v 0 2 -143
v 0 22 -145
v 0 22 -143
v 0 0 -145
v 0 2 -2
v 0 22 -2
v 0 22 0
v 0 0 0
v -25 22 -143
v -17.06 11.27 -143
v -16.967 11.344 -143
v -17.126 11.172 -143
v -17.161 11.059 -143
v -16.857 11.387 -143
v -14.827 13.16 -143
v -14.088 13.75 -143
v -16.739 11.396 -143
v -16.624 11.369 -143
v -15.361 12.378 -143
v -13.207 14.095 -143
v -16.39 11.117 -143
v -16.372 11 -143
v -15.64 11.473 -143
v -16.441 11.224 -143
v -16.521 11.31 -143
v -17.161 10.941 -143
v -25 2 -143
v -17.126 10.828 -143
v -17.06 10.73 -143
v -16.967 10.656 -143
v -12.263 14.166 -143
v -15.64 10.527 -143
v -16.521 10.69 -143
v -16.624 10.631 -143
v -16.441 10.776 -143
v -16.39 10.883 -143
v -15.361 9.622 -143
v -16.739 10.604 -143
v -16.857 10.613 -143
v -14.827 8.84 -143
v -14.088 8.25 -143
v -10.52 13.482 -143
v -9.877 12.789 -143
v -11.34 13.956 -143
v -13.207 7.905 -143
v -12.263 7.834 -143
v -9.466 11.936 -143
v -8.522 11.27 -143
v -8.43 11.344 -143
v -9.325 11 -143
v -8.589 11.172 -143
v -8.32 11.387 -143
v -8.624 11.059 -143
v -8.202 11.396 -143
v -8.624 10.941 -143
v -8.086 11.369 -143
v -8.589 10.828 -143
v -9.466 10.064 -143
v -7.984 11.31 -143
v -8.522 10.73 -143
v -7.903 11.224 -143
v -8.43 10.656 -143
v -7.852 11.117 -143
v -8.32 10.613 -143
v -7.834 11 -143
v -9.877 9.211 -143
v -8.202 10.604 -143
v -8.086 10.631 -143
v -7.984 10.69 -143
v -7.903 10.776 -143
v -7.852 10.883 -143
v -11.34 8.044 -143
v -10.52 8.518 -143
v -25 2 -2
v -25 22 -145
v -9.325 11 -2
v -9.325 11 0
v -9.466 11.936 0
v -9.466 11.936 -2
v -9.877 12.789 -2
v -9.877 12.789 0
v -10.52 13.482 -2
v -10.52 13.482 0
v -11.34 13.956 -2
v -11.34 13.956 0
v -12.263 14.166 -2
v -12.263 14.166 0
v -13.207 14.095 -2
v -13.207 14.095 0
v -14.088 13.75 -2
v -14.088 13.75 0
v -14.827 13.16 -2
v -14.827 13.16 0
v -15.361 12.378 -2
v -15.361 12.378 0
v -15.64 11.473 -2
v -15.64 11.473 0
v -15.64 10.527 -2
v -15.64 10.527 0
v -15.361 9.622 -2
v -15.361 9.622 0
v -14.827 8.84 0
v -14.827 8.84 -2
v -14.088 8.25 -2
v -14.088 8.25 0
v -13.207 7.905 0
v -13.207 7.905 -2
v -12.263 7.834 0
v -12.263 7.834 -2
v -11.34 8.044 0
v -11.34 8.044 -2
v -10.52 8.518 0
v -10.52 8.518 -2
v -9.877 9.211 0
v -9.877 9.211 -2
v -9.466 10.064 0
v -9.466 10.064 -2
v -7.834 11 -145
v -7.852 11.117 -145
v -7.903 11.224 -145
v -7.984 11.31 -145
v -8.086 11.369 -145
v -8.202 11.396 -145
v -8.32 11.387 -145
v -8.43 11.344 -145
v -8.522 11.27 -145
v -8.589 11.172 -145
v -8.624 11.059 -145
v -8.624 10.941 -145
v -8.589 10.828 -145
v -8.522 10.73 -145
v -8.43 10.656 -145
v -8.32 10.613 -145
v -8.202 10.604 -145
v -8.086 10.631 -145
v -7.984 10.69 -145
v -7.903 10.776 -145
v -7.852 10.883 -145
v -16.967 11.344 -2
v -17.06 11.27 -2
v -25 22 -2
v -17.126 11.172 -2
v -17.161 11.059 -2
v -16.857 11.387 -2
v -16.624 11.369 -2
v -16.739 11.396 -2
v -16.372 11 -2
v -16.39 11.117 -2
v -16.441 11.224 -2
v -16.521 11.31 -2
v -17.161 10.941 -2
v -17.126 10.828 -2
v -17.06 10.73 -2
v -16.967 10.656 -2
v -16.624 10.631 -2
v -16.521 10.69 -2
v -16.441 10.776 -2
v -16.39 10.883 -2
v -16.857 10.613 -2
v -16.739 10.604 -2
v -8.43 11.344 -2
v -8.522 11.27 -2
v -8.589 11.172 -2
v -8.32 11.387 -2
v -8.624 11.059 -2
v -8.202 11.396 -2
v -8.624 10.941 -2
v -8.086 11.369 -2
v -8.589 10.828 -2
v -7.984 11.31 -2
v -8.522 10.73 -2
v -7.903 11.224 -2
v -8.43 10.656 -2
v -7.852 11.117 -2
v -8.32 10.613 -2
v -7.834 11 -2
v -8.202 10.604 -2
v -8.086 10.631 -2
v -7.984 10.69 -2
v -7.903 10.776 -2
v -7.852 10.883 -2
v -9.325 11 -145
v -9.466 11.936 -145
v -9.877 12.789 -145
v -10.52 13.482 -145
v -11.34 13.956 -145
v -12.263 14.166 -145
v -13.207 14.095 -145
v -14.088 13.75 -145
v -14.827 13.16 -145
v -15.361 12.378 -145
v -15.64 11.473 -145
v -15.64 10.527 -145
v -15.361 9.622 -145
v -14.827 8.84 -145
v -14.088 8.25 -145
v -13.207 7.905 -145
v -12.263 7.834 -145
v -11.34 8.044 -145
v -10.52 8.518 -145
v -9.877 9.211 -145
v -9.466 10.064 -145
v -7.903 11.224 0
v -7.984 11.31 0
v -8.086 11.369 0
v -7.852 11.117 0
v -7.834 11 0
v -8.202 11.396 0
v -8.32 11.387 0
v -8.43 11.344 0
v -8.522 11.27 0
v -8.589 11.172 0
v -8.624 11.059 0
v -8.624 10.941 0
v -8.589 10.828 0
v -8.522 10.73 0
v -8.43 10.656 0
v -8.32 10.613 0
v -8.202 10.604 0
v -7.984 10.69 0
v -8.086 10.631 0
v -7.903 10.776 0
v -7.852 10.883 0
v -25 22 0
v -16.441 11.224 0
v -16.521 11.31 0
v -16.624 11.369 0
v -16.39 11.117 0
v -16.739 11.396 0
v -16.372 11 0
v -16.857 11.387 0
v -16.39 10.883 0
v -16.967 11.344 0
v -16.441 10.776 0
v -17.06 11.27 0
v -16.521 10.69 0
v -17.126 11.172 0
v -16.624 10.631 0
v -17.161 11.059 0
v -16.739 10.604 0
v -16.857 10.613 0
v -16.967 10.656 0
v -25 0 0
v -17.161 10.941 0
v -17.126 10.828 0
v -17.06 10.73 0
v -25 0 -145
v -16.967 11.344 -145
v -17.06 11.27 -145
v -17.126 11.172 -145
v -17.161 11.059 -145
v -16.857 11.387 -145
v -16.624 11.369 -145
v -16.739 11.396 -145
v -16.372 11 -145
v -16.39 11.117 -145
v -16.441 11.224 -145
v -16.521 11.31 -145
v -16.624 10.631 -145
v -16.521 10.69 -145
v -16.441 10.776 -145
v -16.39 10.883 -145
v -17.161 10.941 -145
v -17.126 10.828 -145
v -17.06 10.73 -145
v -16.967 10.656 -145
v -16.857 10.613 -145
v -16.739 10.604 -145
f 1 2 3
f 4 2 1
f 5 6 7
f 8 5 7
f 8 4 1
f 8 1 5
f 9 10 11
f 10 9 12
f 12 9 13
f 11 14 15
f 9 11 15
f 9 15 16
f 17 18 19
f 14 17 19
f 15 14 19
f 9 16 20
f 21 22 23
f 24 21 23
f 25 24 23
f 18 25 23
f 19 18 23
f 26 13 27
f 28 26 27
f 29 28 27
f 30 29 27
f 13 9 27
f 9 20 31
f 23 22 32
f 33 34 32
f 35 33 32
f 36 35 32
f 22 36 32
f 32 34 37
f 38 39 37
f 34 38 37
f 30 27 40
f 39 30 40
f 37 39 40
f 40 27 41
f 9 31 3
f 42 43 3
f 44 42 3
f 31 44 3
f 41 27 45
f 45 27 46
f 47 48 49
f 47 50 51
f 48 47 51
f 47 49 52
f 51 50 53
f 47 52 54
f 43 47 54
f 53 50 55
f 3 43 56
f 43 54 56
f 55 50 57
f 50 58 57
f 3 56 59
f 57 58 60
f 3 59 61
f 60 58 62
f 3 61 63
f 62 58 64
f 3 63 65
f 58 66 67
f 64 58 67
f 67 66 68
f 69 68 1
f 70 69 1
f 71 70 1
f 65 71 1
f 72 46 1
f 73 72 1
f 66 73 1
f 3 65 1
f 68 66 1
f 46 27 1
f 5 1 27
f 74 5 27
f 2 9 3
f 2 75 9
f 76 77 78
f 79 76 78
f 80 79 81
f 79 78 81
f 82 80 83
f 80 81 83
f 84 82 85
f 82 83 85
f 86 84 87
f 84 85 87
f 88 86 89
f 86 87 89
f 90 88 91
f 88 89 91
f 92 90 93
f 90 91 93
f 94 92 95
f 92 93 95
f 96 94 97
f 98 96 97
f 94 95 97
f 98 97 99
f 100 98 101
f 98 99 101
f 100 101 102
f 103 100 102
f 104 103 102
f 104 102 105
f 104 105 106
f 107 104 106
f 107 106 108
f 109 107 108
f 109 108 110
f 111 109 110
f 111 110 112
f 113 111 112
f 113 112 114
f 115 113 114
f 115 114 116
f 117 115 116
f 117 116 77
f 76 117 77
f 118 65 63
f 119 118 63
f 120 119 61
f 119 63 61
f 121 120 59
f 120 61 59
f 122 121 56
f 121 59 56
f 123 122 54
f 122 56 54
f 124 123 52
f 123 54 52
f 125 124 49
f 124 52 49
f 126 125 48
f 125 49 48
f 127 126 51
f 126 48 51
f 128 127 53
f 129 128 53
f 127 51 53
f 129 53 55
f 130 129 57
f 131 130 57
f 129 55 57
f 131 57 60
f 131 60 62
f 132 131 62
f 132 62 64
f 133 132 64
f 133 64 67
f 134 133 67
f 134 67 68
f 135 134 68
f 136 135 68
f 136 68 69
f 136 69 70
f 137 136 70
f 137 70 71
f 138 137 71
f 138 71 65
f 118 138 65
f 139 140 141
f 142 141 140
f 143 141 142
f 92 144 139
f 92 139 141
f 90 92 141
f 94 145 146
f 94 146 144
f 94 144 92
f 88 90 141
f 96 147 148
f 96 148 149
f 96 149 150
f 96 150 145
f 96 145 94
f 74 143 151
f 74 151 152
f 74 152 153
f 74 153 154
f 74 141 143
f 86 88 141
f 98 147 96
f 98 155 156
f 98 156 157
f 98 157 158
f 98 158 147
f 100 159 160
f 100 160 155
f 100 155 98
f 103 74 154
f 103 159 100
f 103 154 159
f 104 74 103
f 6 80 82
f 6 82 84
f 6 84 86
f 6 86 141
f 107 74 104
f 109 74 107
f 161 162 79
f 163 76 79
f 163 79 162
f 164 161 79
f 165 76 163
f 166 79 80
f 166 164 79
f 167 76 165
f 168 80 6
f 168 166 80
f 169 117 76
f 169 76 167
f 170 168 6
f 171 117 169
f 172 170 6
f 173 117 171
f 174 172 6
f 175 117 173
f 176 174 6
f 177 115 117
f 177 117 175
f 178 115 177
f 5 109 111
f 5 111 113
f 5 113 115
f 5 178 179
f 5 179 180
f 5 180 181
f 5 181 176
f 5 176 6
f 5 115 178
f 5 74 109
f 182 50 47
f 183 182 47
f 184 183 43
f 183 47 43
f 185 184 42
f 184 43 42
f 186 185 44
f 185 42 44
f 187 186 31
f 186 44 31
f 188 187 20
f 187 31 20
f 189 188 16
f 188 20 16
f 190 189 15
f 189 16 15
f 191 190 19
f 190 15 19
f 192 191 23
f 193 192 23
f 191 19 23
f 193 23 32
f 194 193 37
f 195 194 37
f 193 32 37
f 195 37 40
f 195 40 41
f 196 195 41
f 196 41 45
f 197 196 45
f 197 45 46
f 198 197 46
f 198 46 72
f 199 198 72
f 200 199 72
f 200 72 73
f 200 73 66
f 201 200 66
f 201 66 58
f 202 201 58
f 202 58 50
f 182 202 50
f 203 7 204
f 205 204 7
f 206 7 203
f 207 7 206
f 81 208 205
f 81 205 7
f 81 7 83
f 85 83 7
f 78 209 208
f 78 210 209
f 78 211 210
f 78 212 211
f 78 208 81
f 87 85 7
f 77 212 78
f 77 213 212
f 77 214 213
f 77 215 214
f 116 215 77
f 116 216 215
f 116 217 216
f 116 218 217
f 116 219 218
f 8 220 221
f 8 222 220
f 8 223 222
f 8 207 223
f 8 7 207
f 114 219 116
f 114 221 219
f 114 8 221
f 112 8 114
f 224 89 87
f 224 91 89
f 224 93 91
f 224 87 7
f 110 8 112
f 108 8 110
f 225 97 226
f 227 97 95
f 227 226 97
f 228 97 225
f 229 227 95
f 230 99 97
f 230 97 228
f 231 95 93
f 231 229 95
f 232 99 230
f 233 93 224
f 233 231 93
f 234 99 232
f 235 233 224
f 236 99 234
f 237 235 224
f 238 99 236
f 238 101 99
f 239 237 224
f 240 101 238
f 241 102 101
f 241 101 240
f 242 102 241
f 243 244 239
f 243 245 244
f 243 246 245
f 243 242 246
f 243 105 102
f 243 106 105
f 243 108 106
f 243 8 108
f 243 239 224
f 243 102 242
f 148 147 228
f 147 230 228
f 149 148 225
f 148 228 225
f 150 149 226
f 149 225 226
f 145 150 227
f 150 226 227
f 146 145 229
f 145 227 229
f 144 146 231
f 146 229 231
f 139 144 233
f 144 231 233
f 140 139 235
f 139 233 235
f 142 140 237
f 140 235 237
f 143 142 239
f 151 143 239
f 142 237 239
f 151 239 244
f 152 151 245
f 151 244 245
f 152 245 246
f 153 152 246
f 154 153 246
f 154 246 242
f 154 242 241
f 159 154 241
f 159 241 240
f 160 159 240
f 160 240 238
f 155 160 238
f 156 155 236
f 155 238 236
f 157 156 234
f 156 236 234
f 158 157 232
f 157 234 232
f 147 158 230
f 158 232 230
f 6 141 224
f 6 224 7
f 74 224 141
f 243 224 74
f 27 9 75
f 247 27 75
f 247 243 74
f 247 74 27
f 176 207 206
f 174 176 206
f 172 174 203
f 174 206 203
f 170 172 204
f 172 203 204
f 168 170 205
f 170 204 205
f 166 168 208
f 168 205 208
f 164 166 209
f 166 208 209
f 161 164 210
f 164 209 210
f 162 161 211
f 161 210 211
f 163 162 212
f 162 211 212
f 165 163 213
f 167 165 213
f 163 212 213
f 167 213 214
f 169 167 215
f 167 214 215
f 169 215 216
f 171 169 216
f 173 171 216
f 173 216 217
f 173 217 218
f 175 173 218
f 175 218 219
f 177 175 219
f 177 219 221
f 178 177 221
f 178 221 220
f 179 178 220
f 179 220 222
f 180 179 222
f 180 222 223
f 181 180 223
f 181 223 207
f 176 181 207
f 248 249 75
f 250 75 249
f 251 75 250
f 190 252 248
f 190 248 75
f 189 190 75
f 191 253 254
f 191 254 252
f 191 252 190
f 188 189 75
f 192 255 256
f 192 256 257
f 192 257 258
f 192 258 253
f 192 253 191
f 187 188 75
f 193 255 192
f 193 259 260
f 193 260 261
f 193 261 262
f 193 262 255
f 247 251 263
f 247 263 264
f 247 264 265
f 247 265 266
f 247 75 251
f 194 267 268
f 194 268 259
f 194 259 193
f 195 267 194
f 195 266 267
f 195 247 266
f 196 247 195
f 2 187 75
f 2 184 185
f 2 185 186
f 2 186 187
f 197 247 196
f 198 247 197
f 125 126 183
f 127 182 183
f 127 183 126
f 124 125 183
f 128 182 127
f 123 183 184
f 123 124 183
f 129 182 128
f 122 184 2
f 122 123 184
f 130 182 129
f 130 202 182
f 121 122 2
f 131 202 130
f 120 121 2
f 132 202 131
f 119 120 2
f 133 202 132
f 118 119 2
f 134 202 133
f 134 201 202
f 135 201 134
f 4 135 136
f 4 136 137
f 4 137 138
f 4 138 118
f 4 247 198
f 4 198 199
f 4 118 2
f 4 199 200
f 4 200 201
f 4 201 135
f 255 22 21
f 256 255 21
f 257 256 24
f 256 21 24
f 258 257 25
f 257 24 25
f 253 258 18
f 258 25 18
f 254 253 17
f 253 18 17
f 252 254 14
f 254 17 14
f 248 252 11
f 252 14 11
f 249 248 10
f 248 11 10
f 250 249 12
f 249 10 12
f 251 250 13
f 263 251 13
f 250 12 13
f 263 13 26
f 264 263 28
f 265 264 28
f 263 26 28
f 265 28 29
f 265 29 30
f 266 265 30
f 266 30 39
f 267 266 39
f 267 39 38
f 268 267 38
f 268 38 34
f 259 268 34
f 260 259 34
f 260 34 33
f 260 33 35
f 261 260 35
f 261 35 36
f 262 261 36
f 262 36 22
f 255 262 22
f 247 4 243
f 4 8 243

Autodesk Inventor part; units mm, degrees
ref_plane "YZ Plane" through (0, 0, 0) normal (1, 0, 0) x (0, 1, 0)
ref_plane "XZ Plane" through (0, 0, 0) normal (0, 1, 0) x (-1, 0, 0)
ref_plane "XY Plane" through (0, 0, 0) normal (0, 0, 1) x (1, 0, 0)
sketch "Sketch1" plane through (0, 0, 0) normal (0, 1, 0) x (-1, 0, 0)
  line L0 (0, 0) -> (25, 0)
  line L1 (25, 0) -> (25, -145)
  line L2 (25, -145) -> (0, -145)
  line L3 (0, -145) -> (0, 0)
  dimension "d0" = 25
  dimension "d1" = 145
extrude "Extrusion1" add sketch "Sketch1" along normal blind 2
sketch "Sketch2" plane through (0, 2, 0) normal (0, 1, 0) x (1, 0, 0)
  line L0 (-25, 0) -> (0, 0) projected
  line L1 (0, 0) -> (0, 145) projected
  line L2 (0, 145) -> (-25, 145) projected
  line L3 (-25, 145) -> (-25, 0) projected
  line L4 (-25, 145) -> (-25, 0) projected
  line L5 (0, 0) -> (-25, 0)
  line L6 (-25, 0) -> (-25, 2)
  line L7 (-25, 2) -> (0, 2)
  line L8 (0, 2) -> (0, 0)
  line L9 (0, 145) -> (-25, 145)
  line L10 (-25, 145) -> (-25, 143)
  line L11 (-25, 143) -> (0, 143)
  line L12 (0, 143) -> (0, 145)
  dimension "d4" = 2
  dimension "d5" = 2
extrude "Extrusion2" add sketch "Sketch2" along normal blind 20 contours L3 L7 L1 L0 | L3 L2 L1 L11
sketch "Sketch3" plane through (-25, 0, 0) normal (0, 0, 1) x (1, 0, 0)
  line L0 (25, 0) -> (0, 0) projected
  line L1 (25, 0) -> (25, 22) projected
  line L2 (0, 22) -> (25, 22) projected
  line L3 (0, 0) -> (0, 22) projected
  circle A0 centre (12.5, 11) radius 3.175
  circle A1 centre (16.7687, 11) radius 0.3969
  circle A2 centre (8.2312, 11) radius 0.3969
  dimension "d8" = 12.5
  dimension "d9" = 11
  dimension "d10" = 6.35
  dimension "d15" = 0.7937
  dimension "d16" = 0.7937
  dimension "d17" = 8.2312
  dimension "d19" = 8.2312
  dimension "d20" = 11
  dimension "d21" = 11
extrude "Extrusion4" cut sketch "Sketch3" against normal up to surface (145 mm away) contours A0 | A1 | A2
equation "\"d16\" = d15"
properties part number "motor-rail"
